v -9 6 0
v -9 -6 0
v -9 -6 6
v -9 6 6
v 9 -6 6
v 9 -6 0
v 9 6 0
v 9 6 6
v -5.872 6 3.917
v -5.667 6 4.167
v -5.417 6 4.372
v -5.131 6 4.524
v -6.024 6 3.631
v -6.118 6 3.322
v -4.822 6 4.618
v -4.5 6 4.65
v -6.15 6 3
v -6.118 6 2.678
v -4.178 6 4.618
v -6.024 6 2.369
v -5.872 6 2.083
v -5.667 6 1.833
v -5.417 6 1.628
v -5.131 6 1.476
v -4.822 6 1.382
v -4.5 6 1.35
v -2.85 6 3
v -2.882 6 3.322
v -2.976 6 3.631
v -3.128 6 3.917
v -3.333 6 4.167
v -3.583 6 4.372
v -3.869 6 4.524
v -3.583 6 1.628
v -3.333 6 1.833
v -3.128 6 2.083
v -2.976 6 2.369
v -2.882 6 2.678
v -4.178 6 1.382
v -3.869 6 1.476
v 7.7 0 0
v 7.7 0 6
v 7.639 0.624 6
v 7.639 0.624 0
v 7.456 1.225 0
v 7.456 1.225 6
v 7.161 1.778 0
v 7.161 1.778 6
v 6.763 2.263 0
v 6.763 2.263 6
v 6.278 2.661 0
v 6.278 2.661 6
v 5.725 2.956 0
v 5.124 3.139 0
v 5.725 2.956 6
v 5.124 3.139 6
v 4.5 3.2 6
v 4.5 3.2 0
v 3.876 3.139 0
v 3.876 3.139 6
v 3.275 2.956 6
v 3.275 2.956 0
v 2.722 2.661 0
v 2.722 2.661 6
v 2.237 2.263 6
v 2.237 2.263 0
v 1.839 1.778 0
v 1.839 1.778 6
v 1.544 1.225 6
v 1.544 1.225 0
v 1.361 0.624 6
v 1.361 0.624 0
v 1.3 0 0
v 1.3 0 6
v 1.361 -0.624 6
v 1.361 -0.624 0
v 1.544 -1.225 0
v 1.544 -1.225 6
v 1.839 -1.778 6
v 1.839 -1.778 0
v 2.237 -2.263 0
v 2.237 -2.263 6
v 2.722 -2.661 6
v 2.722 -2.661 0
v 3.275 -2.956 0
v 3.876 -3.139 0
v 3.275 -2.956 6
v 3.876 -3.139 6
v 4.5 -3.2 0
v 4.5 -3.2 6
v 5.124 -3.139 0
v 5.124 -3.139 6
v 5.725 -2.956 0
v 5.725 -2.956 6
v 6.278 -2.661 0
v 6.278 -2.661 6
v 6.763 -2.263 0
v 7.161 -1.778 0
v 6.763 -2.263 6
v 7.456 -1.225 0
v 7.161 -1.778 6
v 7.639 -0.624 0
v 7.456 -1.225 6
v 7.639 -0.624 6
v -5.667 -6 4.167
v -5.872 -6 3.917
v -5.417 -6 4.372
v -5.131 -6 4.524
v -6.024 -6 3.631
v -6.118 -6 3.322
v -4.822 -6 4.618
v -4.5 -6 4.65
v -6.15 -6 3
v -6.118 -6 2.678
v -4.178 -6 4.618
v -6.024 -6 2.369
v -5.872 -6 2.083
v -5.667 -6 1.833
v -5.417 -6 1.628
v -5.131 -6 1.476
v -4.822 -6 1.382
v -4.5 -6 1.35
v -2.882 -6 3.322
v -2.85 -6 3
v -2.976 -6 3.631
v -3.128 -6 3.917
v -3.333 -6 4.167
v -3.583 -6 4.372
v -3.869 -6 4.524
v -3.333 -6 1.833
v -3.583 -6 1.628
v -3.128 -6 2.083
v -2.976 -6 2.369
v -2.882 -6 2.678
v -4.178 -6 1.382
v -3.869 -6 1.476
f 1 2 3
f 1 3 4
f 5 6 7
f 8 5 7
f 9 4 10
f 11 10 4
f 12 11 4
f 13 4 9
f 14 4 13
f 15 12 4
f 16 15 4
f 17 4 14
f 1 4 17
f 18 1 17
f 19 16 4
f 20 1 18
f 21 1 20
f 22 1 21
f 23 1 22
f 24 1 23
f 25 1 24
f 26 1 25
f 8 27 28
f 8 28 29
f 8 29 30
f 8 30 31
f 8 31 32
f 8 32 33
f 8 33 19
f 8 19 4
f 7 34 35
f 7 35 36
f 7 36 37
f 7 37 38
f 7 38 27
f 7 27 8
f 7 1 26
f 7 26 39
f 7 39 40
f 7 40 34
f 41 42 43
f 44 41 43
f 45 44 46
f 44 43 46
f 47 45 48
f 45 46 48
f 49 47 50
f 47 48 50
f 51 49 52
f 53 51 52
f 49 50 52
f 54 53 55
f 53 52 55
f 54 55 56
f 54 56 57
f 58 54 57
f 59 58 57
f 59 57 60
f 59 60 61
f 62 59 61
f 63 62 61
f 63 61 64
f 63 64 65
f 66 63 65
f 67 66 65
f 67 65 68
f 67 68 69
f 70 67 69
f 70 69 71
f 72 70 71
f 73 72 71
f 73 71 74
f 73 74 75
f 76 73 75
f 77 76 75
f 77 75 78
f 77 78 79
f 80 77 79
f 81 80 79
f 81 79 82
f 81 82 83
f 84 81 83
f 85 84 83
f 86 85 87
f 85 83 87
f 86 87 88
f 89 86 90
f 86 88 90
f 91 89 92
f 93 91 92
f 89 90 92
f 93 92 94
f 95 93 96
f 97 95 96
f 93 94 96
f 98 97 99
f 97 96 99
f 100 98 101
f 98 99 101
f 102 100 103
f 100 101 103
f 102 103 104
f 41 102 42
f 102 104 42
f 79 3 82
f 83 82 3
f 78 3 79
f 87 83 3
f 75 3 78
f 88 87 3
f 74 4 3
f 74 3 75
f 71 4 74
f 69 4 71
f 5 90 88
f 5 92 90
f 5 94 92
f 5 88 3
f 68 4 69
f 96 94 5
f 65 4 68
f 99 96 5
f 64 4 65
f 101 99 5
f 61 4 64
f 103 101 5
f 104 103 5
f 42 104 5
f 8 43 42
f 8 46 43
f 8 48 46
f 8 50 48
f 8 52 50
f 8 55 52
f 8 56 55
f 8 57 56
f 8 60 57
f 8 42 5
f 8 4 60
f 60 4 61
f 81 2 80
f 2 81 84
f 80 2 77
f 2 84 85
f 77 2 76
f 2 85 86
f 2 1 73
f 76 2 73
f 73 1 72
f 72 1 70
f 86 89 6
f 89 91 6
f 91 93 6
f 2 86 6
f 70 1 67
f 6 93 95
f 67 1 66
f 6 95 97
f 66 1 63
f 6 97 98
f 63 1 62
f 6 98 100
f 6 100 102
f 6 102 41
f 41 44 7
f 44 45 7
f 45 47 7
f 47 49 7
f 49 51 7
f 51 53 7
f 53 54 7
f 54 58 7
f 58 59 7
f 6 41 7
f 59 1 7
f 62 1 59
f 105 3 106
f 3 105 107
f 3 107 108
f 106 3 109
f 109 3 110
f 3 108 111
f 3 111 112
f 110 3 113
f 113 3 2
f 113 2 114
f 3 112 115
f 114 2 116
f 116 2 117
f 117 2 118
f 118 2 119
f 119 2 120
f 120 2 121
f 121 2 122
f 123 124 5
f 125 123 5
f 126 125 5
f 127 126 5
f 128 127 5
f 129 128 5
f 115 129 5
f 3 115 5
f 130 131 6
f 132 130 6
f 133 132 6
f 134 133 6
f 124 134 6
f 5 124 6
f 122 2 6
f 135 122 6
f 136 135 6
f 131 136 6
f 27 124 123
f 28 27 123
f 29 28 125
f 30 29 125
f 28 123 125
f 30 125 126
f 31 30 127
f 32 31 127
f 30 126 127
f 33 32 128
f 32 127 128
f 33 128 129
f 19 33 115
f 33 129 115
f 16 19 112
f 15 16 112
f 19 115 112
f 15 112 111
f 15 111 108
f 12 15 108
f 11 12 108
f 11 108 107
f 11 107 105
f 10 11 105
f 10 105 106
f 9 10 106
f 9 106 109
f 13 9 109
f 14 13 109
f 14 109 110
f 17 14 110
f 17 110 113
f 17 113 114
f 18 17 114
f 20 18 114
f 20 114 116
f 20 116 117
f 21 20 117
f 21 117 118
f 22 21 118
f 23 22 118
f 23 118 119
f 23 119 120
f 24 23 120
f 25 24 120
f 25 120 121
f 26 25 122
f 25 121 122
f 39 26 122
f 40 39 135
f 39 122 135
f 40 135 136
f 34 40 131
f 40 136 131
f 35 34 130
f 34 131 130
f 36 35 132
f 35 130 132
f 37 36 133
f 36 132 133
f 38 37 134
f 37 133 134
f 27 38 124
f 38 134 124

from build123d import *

# Parameters (mm, degrees)
F0_W     = 18
F0_H     = 12
F1_DEPTH = 6
F2_R     = 1.65
F4_DEPTH = 25
F3_R     = 3.2
F5_DEPTH = 25


with BuildPart() as f1:
    # F0 (on Top) → F1 (new body)
    with BuildSketch(Plane.XY):
        Rectangle(F0_W, F0_H)
    extrude(amount=F1_DEPTH)

    # F2 (on face) → F4 (cut)
    with BuildSketch(Plane.XZ.offset(6)):
        with Locations((-4.5, 3)):
            Circle(F2_R)
    extrude(amount=-F4_DEPTH, mode=Mode.SUBTRACT)

    # F3 (on face) → F5 (cut)
    with BuildSketch(Plane.XY.offset(6)):
        with Locations((4.5, 0)):
            Circle(F3_R)
    extrude(amount=-F5_DEPTH, mode=Mode.SUBTRACT)


solid = f1.part
